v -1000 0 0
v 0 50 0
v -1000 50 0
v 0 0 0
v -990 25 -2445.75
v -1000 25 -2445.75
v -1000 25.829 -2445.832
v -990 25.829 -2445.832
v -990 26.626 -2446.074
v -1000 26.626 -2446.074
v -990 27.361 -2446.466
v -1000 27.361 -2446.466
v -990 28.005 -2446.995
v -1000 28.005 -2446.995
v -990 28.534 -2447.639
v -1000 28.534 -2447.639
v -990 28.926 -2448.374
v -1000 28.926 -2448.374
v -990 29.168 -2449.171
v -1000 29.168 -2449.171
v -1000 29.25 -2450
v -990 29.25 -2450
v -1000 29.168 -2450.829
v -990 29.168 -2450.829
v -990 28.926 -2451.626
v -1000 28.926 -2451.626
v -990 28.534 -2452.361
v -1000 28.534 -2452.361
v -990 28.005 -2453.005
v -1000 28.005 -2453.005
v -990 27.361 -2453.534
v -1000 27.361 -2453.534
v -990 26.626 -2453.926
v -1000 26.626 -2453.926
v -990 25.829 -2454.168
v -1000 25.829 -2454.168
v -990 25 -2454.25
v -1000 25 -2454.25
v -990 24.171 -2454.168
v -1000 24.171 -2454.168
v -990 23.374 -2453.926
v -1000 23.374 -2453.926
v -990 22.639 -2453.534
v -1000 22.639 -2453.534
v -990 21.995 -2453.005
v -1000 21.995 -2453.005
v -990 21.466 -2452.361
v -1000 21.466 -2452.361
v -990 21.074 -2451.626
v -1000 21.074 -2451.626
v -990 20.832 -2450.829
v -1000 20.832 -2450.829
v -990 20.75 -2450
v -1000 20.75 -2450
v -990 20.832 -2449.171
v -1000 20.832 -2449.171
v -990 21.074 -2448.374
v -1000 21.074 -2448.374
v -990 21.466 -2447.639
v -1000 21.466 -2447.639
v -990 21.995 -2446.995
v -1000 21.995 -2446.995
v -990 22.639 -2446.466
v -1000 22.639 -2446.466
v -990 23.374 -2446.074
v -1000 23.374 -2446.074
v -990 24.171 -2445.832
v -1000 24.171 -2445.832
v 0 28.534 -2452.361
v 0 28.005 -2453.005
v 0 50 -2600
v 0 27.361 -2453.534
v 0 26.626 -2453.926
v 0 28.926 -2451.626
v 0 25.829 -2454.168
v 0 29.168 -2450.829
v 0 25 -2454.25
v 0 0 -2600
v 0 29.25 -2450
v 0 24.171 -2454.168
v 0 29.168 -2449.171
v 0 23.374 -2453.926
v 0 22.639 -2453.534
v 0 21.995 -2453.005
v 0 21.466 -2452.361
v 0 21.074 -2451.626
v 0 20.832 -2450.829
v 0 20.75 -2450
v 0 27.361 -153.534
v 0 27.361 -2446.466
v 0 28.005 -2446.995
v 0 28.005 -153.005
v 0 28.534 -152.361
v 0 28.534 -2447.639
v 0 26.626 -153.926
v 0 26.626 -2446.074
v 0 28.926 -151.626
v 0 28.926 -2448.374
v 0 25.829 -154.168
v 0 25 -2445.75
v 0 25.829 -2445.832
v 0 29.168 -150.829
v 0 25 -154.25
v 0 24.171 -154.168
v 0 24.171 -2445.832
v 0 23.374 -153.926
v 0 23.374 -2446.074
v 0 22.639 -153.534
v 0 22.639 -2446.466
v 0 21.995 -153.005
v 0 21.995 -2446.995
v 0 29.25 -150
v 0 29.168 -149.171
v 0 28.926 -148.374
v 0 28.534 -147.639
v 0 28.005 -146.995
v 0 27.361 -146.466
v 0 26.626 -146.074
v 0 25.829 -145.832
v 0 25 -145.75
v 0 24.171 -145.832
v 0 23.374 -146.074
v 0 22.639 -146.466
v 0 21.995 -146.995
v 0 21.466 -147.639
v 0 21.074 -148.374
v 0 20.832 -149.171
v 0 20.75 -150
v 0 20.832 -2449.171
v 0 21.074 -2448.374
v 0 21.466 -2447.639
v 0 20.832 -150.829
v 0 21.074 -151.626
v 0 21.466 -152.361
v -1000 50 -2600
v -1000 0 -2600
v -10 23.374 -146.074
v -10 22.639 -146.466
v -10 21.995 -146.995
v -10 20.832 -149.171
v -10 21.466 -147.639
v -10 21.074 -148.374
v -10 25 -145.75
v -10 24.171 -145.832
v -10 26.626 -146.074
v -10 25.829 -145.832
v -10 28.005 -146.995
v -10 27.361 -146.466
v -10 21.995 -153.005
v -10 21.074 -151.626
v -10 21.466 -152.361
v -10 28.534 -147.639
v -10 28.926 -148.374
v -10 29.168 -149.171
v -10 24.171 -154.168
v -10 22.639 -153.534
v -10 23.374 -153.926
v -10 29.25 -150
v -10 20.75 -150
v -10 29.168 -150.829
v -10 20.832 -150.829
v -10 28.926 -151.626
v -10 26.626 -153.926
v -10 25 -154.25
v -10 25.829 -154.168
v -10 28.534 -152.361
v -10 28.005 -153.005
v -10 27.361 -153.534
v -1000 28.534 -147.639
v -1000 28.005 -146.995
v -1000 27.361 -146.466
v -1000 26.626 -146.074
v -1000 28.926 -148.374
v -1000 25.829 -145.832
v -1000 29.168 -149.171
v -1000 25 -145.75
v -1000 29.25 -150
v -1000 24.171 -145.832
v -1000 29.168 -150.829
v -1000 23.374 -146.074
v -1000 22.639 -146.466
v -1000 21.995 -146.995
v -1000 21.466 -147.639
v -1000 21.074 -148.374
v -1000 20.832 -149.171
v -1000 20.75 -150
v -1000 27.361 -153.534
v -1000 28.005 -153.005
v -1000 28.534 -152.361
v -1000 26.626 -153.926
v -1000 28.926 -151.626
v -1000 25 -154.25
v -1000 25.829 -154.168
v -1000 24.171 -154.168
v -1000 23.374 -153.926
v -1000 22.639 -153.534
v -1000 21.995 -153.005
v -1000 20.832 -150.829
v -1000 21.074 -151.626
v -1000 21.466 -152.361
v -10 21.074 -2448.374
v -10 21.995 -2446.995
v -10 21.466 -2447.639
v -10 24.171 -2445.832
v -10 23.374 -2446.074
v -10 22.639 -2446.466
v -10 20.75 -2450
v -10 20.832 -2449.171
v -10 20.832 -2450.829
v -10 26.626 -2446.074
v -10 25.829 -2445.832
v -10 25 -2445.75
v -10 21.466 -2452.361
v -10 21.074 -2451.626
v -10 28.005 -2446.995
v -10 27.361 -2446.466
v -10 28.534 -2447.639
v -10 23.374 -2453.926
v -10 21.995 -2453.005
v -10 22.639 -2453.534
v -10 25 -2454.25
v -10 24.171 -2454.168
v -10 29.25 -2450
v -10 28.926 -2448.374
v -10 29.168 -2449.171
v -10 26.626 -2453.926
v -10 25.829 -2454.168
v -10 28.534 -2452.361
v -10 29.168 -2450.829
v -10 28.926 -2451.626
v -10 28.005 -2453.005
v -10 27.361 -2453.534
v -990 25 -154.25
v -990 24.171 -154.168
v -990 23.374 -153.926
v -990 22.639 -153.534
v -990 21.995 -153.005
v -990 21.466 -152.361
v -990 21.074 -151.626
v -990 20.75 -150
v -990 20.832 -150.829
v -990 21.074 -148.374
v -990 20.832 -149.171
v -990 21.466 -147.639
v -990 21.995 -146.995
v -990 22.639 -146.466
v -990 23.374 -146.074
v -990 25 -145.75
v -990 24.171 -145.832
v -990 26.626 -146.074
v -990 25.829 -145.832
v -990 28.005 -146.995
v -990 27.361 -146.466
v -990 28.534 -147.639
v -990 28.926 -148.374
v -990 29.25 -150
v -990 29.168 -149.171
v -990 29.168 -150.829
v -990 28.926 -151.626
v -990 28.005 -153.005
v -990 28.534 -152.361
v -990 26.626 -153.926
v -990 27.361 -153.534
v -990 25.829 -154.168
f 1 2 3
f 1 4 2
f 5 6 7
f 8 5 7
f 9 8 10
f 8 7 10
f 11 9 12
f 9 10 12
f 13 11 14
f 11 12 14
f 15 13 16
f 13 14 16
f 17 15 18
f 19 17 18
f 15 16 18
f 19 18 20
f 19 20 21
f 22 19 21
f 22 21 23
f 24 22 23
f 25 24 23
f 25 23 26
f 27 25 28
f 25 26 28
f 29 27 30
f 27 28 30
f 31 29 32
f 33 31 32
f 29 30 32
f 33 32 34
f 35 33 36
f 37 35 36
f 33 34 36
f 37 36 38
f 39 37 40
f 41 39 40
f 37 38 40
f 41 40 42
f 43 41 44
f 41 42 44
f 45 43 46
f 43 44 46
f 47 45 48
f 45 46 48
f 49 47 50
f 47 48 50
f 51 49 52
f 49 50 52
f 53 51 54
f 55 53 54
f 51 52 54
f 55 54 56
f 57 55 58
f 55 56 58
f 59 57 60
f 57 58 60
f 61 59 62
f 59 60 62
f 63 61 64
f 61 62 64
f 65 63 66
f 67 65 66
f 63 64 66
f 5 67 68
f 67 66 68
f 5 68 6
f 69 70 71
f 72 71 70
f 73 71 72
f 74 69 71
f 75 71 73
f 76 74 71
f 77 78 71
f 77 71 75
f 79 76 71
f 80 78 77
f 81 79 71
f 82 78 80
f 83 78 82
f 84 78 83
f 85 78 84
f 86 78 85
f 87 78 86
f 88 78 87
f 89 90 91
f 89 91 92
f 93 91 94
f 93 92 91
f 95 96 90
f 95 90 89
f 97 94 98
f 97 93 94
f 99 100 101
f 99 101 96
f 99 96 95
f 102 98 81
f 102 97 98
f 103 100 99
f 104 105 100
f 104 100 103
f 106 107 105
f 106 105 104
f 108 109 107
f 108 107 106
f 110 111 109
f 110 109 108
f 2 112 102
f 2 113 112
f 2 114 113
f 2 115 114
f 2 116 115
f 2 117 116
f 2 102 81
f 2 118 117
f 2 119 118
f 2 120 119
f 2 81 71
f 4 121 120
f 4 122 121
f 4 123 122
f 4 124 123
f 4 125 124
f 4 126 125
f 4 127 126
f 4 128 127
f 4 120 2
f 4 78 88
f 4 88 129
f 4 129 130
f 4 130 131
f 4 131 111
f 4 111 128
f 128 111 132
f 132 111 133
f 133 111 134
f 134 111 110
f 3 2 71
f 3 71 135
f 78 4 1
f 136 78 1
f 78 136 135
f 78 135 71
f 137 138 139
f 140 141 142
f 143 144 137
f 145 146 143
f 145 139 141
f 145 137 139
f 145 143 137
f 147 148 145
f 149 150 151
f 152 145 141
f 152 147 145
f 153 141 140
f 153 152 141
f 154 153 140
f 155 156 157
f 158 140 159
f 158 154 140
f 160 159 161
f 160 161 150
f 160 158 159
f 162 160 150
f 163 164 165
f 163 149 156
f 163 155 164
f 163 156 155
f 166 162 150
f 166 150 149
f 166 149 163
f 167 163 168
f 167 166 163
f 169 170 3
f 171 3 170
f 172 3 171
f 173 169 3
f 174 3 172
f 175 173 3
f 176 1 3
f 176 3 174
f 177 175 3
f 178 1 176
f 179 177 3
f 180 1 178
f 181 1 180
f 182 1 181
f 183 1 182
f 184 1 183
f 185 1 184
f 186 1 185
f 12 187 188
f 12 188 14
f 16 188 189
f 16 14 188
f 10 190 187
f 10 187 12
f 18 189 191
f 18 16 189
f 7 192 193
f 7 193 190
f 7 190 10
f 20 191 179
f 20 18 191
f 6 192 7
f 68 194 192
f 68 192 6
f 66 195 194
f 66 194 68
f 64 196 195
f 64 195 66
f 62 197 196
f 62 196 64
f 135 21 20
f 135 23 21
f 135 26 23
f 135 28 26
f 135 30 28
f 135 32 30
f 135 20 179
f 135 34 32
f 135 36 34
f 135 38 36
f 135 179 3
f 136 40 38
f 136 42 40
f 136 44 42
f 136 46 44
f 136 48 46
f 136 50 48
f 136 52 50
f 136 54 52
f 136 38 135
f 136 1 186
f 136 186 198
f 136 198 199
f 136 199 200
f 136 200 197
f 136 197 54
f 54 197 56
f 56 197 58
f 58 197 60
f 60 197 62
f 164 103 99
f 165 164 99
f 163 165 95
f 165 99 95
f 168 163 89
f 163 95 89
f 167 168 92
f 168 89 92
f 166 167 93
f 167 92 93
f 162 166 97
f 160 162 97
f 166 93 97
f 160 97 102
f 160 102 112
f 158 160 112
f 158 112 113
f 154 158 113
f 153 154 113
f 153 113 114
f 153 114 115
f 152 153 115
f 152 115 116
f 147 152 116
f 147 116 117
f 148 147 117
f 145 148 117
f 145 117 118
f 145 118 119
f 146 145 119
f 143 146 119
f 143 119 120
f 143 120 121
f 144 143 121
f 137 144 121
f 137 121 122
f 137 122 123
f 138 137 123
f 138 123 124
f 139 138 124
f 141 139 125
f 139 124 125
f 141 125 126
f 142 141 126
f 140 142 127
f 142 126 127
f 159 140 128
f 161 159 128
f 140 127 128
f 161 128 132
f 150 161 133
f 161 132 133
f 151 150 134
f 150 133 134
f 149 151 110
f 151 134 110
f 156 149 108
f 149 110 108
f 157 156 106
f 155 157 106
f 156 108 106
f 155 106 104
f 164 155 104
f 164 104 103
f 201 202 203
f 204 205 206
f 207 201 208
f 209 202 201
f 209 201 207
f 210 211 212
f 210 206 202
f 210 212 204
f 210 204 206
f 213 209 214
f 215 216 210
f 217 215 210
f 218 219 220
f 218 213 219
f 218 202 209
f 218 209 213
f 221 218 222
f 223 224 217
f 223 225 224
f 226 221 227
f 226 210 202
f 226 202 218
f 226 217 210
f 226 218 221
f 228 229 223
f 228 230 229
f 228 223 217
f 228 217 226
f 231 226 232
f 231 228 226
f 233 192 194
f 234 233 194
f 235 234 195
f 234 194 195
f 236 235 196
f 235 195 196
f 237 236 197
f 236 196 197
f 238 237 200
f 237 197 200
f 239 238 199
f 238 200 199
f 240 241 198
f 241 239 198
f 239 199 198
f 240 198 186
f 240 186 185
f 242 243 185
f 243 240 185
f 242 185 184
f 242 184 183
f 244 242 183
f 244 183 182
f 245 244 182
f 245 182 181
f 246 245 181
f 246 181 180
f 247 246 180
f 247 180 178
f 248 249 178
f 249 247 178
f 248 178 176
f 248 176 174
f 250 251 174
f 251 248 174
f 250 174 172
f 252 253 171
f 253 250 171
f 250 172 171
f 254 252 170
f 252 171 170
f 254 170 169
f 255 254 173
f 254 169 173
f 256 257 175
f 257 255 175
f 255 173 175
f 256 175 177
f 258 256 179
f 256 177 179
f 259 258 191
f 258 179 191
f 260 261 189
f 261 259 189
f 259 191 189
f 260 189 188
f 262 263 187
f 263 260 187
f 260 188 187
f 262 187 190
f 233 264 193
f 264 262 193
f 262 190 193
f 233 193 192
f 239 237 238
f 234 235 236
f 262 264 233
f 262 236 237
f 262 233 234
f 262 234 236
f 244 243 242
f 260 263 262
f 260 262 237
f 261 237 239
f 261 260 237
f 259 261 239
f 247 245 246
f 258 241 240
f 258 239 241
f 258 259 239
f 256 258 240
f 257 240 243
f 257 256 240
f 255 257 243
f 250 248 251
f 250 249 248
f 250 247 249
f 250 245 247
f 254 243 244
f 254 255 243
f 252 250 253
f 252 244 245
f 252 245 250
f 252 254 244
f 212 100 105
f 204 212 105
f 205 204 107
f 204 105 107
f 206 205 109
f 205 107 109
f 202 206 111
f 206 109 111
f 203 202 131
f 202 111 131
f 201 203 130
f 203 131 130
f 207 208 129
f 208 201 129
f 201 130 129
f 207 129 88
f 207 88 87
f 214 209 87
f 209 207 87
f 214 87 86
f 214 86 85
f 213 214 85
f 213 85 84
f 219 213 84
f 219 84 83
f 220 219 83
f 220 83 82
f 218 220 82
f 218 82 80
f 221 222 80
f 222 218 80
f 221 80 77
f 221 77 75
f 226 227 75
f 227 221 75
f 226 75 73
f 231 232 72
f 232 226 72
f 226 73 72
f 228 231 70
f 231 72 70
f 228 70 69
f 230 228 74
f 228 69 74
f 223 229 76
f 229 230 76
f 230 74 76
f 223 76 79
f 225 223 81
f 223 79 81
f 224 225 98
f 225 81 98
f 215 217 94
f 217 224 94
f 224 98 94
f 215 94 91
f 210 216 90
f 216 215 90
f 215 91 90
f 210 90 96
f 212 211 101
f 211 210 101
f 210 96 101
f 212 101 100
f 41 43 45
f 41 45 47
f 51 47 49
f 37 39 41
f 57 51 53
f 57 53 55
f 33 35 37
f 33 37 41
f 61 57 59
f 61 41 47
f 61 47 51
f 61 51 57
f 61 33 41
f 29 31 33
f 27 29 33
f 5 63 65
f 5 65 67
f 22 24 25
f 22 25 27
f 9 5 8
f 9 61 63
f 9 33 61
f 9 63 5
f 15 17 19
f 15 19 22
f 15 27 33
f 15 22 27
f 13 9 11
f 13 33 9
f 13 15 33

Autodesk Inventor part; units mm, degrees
ref_plane "YZ Plane" through (0, 0, 0) normal (1, 0, 0) x (0, 1, 0)
sketch "Sketch1" plane through (0, 0, 0) normal (0, 1, 0) x (-1, 0, 0)
  line L0 (0, 0) -> (1000, 0)
  line L1 (1000, 0) -> (1000, -2600)
  line L2 (1000, -2600) -> (0, -2600)
  line L3 (0, -2600) -> (0, 0)
  dimension "d0" = 1000
  dimension "d1" = 2600
extrude "Extrusion1" add sketch "Sketch1" along normal blind 50
sketch "Sketch2" plane through (0, 0, 0) normal (1, 0, 0) x (0, 0, -1)
  circle A0 centre (150, 25) radius 4.25
  line L0 (2600, 0) -> (0, 0) projected
  line L1 (0, 0) -> (0, 50) projected
  dimension "d4" = 8.5
  dimension "d5" = 25
  dimension "d8" = 150
extrude "Extrusion2" cut sketch "Sketch2" against normal blind 10
ref_plane "Work Plane2" through (-1000, 0, -1300) normal (0, 0, 1) x (1, 0, 0)
ref_plane "Work Plane3" through (-500, 0, -2600) normal (-1, 0, 0) x (0, 0, 1)
mirror "Mirror1" about plane through (-1000, 0, -1300) normal (0, 0, 1) of "Extrusion2"
mirror "Mirror2" about plane through (-500, 0, -2600) normal (-1, 0, 0) of "Extrusion2", "Mirror1"
properties part number "InsulatorWallNorrowasa" material "Polyethylene, Low Density"
